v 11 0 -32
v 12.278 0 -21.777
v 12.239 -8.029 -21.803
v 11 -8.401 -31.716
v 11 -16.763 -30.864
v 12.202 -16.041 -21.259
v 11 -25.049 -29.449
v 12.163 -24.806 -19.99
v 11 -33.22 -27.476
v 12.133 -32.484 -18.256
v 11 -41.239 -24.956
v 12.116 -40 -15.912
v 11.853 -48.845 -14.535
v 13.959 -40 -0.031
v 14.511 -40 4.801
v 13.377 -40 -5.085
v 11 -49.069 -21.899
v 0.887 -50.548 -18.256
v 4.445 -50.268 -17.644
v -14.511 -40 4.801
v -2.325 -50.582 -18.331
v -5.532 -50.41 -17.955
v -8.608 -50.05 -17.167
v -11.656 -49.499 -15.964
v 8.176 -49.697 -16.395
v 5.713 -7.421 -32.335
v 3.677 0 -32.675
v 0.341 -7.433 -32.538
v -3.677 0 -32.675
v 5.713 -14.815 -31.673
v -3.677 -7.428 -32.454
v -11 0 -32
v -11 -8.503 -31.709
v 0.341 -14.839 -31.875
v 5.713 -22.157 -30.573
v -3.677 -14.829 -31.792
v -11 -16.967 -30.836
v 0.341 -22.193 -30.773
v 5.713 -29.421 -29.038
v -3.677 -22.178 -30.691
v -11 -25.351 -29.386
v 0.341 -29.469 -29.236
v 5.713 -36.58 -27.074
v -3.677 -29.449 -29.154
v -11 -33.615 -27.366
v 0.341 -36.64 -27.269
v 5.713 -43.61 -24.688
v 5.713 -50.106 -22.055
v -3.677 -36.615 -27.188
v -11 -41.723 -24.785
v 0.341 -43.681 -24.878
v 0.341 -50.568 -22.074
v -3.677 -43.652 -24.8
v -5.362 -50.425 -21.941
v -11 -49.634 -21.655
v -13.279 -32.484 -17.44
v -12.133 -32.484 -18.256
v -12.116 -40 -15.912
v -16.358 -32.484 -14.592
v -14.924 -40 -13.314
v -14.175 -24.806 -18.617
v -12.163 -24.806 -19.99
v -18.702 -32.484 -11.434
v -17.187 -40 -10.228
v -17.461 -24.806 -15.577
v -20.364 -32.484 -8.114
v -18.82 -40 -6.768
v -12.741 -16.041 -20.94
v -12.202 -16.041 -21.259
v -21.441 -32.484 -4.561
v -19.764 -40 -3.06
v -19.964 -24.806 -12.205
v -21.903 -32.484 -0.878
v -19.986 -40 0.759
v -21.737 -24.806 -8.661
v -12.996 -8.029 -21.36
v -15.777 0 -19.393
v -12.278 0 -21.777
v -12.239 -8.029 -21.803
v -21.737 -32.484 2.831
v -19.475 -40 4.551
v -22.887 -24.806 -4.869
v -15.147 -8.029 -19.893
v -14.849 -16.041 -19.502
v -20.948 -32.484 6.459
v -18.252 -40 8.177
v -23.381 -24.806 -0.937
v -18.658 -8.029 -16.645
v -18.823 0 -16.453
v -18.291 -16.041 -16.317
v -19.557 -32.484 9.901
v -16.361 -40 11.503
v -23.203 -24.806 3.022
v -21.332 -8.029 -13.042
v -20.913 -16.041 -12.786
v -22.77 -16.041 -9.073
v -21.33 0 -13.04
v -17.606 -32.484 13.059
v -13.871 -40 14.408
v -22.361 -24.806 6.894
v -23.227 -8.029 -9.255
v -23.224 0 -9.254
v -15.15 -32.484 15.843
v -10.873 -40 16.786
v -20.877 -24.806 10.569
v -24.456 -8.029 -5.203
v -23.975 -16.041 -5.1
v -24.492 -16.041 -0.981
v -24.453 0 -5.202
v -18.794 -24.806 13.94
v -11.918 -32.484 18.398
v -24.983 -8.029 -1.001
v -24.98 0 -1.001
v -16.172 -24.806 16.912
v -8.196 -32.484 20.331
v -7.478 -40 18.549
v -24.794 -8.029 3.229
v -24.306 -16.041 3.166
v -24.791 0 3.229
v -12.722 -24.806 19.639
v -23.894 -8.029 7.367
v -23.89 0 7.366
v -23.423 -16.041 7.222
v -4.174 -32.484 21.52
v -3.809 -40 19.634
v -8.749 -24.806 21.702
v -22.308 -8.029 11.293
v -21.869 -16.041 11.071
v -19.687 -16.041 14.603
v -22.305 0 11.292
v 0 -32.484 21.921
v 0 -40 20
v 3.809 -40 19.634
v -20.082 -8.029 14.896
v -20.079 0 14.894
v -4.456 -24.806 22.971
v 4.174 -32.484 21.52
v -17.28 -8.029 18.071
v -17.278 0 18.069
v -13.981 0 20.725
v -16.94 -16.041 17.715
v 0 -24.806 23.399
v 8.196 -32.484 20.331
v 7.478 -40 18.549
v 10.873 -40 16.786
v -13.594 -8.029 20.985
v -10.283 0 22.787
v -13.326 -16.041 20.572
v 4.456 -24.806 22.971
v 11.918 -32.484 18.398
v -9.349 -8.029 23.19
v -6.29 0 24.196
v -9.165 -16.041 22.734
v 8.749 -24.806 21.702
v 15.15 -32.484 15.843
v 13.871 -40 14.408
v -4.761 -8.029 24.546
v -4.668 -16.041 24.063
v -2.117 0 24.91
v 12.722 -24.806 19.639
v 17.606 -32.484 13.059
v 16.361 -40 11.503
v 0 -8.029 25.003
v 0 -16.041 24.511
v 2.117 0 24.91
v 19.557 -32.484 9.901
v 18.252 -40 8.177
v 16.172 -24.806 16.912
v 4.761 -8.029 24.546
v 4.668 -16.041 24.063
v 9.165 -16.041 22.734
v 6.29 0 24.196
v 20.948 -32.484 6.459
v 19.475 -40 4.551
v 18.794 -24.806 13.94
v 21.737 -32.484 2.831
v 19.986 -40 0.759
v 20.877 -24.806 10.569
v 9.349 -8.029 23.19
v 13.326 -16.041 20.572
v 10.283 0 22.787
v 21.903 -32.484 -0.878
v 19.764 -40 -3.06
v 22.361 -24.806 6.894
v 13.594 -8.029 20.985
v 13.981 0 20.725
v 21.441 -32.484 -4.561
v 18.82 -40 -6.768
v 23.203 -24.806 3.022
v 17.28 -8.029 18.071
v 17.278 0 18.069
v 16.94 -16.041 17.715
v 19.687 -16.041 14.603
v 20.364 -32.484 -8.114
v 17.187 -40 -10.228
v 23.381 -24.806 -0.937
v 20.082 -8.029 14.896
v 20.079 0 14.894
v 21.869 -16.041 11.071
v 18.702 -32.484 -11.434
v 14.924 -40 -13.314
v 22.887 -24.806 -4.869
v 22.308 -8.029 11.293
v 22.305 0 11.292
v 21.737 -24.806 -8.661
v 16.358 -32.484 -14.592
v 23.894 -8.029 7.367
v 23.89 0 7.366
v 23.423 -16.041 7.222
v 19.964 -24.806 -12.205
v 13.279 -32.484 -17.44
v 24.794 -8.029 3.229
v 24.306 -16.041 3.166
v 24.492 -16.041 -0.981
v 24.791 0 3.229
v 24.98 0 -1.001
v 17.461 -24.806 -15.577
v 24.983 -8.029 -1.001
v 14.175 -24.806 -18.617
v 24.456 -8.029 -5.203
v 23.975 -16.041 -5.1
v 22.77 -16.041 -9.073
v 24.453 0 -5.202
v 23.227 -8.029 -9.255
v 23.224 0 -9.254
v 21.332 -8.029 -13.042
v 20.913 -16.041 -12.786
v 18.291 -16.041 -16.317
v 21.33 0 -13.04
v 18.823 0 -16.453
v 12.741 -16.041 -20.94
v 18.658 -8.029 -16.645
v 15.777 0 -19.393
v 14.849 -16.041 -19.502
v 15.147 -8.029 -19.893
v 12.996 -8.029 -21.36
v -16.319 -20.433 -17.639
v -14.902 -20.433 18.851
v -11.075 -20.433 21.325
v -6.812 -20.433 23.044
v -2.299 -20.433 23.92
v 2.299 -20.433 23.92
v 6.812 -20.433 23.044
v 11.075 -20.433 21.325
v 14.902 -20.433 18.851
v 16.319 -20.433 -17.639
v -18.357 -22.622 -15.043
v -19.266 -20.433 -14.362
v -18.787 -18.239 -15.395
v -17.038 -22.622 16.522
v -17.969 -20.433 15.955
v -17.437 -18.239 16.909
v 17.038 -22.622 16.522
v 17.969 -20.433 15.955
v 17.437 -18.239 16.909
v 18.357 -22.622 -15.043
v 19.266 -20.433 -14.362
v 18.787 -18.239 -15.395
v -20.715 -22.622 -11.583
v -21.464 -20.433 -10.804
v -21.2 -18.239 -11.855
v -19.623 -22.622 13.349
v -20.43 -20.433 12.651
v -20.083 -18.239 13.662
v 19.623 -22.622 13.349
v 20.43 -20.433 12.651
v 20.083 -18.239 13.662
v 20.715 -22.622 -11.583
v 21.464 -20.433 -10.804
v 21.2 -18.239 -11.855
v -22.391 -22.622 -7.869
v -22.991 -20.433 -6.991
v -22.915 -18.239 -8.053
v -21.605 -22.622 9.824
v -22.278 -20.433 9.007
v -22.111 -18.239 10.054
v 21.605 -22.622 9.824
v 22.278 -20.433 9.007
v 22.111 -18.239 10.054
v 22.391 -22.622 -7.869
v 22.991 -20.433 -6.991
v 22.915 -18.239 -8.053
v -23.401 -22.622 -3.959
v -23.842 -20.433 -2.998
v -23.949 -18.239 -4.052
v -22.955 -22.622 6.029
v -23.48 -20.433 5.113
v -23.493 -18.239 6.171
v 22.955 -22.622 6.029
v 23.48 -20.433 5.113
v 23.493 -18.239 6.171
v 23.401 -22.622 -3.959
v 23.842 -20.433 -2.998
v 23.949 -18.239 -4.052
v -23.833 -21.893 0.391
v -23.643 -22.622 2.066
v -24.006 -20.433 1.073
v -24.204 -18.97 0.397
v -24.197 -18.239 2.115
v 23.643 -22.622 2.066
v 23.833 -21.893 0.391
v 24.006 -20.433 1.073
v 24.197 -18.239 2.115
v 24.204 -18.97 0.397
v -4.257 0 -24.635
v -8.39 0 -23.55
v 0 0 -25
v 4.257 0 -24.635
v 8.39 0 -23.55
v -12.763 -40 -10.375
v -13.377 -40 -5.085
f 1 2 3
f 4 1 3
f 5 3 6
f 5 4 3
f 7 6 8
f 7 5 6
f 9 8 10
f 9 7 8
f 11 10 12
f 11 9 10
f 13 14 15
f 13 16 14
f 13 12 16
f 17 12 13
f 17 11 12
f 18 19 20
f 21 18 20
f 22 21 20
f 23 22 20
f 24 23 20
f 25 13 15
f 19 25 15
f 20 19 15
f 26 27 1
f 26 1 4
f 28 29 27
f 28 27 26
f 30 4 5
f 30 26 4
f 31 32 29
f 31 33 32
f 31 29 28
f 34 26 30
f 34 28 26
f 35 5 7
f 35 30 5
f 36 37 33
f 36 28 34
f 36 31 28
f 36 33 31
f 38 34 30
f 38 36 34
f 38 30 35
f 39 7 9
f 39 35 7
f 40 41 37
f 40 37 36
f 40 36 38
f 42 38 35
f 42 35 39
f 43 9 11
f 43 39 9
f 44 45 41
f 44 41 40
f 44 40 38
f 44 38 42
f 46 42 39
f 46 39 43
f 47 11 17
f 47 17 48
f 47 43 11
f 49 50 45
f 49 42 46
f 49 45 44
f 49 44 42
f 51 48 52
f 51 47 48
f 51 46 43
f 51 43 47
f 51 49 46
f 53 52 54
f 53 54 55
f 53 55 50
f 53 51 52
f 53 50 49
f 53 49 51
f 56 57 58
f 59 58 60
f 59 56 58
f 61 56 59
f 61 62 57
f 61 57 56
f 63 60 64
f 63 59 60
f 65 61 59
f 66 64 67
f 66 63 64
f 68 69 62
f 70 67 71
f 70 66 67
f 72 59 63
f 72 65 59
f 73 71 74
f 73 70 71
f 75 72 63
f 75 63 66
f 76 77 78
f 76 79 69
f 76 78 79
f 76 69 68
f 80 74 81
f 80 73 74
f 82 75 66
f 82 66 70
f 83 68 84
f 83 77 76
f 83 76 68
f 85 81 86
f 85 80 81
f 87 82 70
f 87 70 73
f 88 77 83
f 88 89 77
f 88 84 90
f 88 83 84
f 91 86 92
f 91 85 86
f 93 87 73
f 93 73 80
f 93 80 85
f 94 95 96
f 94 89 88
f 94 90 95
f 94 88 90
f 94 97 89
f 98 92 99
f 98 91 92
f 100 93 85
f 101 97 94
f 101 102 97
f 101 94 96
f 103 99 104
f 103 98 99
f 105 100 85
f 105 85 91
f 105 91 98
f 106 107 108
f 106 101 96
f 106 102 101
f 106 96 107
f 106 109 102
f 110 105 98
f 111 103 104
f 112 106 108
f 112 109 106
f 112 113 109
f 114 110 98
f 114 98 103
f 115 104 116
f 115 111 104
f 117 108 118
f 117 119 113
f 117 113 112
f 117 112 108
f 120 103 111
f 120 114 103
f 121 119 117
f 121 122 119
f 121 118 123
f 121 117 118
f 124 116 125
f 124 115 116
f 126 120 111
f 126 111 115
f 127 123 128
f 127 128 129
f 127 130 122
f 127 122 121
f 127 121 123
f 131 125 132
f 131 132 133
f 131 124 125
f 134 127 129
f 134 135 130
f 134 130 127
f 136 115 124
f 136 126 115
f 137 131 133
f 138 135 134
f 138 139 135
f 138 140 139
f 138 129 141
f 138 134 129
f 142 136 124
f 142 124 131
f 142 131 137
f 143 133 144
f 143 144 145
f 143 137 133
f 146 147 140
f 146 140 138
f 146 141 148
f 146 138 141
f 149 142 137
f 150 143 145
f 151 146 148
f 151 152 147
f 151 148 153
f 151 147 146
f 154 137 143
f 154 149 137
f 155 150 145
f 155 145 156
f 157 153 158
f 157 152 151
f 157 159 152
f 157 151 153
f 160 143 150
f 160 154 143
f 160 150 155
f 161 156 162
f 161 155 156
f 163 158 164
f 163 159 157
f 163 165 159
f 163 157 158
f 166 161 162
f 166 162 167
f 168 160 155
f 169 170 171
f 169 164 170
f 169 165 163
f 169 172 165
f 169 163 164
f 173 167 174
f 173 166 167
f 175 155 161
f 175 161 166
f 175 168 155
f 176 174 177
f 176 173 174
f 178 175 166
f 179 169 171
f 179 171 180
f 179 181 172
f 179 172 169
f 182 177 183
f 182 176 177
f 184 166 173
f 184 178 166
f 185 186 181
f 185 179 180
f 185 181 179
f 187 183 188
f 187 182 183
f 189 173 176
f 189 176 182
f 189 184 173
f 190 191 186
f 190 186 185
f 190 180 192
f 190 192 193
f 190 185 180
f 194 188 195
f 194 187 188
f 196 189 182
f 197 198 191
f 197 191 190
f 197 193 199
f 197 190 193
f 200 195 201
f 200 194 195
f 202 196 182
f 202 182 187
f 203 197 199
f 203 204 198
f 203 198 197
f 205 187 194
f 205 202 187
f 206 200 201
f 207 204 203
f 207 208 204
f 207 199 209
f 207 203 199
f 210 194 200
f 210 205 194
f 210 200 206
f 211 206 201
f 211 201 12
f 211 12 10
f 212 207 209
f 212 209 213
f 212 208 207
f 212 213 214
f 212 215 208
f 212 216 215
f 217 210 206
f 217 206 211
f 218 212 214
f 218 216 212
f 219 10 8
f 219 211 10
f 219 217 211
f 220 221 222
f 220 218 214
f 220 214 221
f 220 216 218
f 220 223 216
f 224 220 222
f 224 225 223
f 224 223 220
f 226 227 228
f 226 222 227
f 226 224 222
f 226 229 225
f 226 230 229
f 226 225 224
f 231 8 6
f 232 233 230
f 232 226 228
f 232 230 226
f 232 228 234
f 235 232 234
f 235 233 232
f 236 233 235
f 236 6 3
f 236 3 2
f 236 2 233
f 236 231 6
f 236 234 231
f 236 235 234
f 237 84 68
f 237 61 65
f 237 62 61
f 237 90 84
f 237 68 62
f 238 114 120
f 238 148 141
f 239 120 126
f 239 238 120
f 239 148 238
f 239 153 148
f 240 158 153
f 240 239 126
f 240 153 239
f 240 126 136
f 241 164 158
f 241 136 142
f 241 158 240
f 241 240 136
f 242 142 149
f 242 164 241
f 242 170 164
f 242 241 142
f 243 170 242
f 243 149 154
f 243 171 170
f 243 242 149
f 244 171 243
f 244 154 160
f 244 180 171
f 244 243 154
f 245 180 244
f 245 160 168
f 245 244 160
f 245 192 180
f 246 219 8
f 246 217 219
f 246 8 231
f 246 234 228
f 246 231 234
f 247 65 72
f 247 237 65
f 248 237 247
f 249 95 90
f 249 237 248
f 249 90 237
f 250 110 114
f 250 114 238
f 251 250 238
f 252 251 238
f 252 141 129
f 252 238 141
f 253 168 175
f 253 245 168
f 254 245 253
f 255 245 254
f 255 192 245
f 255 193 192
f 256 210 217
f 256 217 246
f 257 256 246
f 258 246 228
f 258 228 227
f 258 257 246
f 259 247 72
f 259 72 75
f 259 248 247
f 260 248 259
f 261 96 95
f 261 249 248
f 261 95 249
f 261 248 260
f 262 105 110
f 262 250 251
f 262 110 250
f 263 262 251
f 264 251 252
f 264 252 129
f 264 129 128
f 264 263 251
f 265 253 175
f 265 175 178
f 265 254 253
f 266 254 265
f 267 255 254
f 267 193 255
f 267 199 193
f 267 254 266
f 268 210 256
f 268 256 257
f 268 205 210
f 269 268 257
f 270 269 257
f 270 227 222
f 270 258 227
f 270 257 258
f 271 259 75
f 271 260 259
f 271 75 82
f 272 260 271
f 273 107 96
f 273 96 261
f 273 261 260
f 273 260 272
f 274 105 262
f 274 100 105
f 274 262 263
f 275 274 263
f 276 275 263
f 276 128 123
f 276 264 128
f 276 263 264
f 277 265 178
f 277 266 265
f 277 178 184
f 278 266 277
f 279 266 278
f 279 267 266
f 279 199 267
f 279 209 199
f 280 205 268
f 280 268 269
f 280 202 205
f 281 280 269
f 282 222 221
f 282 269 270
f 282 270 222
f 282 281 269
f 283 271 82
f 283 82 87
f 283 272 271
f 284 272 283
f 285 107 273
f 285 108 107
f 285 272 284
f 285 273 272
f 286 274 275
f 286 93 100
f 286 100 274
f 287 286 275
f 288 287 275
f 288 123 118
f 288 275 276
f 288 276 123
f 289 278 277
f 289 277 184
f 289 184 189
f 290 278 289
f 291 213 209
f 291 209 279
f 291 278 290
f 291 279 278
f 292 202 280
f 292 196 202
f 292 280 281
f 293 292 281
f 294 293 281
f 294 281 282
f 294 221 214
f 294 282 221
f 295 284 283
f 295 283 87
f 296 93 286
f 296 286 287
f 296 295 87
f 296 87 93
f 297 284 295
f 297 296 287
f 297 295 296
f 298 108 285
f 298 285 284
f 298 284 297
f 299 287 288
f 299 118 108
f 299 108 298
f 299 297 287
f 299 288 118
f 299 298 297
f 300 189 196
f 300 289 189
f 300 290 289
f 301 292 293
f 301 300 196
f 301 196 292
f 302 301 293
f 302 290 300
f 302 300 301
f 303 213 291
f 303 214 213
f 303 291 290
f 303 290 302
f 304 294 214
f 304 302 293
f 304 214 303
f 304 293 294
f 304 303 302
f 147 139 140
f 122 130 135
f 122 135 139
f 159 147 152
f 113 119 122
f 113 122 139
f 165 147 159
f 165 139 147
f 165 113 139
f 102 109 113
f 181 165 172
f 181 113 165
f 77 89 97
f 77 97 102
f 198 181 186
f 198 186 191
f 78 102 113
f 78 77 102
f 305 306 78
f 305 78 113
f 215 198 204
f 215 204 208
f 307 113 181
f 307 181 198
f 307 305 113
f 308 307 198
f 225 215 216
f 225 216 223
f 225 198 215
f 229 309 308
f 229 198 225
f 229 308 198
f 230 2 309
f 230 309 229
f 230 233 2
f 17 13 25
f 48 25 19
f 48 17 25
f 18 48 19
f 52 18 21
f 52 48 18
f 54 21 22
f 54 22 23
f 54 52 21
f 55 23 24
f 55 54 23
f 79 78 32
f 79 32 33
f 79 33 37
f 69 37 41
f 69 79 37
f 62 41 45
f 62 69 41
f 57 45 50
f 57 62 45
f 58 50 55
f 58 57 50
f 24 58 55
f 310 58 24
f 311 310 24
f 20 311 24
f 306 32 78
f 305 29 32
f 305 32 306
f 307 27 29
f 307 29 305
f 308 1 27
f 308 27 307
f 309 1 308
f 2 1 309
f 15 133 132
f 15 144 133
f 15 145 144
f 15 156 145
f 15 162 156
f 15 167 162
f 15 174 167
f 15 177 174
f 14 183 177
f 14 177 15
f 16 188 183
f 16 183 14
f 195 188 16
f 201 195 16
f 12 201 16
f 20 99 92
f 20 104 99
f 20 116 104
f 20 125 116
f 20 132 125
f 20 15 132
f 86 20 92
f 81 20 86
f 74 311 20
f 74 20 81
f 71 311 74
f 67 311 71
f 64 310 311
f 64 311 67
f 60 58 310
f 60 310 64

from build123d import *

# Parameters (mm, degrees)
CUT_EXTRUDE_1_DEPTH      = 67.373183556
CUT_EXTRUDE_1_DEPTH_BACK = 67.373183556


# Read off the part's stored shape, not the designer's step: Поверхность-Сшить1
with BuildPart() as part:
    # Knit 1 outline → Knit 1 (revolve)
    with BuildSketch(Plane.XY):
        with BuildLine():
            Line((0, 0), (0, -40))
            Line((0, -40), (20, -40))
            ThreePointArc((20, -40), (24.059865396, -20.194983175), (25, 0))
            Line((25, 0), (0, 0))
        make_face()
    revolve(axis=Axis((0, 0, 0), (0, 1, 0)))

    # По траектории1: sweep along a path in Эскиз3
    with BuildLine(Plane(origin=(0, 0, 0), x_dir=(0, 0, -1), z_dir=(1, 0, 0))) as sweep_1_path:
        ThreePointArc((32.759858657, 0), (29.894665497, -26.609940967), (21.430435325, -52))
    # Эскиз2 → По траектории1 (sweep)
    with BuildSketch(Plane(origin=(0, 0, 0), x_dir=(1, 0, 0), z_dir=(0, 1, 0))):
        with BuildLine():
            Line((-15, 0), (15, 0))
            Line((15, 0), (11, 32))
            ThreePointArc((11, 32), (0, 32.759858657), (-11, 32))
            Line((-11, 32), (-15, 0))
        make_face()
    sweep(path=sweep_1_path.line)

    # Эскиз4 → Вырез-Вытянуть1 (cut, two sides: drawn at the far end of the back side and taken through both)
    with BuildSketch(Plane.XY.offset(-CUT_EXTRUDE_1_DEPTH_BACK)):
        with BuildLine():
            Line((145.597430233, 60.060046505), (31.407892686, -38.452179183))
            ThreePointArc((31.407892686, -38.452179183), (-1.252964611, -50.593647771), (-33.913821908, -38.452179183))
            Line((-33.913821908, -38.452179183), (-148.103359455, 60.060046505))
            Line((-148.103359455, 60.060046505), (-148.103359455, -241.561631066))
            Line((-148.103359455, -241.561631066), (145.597430233, -241.561631066))
            Line((145.597430233, -241.561631066), (145.597430233, 60.060046505))
        make_face()
    extrude(amount=CUT_EXTRUDE_1_DEPTH + CUT_EXTRUDE_1_DEPTH_BACK, mode=Mode.SUBTRACT)


solid = part.part
